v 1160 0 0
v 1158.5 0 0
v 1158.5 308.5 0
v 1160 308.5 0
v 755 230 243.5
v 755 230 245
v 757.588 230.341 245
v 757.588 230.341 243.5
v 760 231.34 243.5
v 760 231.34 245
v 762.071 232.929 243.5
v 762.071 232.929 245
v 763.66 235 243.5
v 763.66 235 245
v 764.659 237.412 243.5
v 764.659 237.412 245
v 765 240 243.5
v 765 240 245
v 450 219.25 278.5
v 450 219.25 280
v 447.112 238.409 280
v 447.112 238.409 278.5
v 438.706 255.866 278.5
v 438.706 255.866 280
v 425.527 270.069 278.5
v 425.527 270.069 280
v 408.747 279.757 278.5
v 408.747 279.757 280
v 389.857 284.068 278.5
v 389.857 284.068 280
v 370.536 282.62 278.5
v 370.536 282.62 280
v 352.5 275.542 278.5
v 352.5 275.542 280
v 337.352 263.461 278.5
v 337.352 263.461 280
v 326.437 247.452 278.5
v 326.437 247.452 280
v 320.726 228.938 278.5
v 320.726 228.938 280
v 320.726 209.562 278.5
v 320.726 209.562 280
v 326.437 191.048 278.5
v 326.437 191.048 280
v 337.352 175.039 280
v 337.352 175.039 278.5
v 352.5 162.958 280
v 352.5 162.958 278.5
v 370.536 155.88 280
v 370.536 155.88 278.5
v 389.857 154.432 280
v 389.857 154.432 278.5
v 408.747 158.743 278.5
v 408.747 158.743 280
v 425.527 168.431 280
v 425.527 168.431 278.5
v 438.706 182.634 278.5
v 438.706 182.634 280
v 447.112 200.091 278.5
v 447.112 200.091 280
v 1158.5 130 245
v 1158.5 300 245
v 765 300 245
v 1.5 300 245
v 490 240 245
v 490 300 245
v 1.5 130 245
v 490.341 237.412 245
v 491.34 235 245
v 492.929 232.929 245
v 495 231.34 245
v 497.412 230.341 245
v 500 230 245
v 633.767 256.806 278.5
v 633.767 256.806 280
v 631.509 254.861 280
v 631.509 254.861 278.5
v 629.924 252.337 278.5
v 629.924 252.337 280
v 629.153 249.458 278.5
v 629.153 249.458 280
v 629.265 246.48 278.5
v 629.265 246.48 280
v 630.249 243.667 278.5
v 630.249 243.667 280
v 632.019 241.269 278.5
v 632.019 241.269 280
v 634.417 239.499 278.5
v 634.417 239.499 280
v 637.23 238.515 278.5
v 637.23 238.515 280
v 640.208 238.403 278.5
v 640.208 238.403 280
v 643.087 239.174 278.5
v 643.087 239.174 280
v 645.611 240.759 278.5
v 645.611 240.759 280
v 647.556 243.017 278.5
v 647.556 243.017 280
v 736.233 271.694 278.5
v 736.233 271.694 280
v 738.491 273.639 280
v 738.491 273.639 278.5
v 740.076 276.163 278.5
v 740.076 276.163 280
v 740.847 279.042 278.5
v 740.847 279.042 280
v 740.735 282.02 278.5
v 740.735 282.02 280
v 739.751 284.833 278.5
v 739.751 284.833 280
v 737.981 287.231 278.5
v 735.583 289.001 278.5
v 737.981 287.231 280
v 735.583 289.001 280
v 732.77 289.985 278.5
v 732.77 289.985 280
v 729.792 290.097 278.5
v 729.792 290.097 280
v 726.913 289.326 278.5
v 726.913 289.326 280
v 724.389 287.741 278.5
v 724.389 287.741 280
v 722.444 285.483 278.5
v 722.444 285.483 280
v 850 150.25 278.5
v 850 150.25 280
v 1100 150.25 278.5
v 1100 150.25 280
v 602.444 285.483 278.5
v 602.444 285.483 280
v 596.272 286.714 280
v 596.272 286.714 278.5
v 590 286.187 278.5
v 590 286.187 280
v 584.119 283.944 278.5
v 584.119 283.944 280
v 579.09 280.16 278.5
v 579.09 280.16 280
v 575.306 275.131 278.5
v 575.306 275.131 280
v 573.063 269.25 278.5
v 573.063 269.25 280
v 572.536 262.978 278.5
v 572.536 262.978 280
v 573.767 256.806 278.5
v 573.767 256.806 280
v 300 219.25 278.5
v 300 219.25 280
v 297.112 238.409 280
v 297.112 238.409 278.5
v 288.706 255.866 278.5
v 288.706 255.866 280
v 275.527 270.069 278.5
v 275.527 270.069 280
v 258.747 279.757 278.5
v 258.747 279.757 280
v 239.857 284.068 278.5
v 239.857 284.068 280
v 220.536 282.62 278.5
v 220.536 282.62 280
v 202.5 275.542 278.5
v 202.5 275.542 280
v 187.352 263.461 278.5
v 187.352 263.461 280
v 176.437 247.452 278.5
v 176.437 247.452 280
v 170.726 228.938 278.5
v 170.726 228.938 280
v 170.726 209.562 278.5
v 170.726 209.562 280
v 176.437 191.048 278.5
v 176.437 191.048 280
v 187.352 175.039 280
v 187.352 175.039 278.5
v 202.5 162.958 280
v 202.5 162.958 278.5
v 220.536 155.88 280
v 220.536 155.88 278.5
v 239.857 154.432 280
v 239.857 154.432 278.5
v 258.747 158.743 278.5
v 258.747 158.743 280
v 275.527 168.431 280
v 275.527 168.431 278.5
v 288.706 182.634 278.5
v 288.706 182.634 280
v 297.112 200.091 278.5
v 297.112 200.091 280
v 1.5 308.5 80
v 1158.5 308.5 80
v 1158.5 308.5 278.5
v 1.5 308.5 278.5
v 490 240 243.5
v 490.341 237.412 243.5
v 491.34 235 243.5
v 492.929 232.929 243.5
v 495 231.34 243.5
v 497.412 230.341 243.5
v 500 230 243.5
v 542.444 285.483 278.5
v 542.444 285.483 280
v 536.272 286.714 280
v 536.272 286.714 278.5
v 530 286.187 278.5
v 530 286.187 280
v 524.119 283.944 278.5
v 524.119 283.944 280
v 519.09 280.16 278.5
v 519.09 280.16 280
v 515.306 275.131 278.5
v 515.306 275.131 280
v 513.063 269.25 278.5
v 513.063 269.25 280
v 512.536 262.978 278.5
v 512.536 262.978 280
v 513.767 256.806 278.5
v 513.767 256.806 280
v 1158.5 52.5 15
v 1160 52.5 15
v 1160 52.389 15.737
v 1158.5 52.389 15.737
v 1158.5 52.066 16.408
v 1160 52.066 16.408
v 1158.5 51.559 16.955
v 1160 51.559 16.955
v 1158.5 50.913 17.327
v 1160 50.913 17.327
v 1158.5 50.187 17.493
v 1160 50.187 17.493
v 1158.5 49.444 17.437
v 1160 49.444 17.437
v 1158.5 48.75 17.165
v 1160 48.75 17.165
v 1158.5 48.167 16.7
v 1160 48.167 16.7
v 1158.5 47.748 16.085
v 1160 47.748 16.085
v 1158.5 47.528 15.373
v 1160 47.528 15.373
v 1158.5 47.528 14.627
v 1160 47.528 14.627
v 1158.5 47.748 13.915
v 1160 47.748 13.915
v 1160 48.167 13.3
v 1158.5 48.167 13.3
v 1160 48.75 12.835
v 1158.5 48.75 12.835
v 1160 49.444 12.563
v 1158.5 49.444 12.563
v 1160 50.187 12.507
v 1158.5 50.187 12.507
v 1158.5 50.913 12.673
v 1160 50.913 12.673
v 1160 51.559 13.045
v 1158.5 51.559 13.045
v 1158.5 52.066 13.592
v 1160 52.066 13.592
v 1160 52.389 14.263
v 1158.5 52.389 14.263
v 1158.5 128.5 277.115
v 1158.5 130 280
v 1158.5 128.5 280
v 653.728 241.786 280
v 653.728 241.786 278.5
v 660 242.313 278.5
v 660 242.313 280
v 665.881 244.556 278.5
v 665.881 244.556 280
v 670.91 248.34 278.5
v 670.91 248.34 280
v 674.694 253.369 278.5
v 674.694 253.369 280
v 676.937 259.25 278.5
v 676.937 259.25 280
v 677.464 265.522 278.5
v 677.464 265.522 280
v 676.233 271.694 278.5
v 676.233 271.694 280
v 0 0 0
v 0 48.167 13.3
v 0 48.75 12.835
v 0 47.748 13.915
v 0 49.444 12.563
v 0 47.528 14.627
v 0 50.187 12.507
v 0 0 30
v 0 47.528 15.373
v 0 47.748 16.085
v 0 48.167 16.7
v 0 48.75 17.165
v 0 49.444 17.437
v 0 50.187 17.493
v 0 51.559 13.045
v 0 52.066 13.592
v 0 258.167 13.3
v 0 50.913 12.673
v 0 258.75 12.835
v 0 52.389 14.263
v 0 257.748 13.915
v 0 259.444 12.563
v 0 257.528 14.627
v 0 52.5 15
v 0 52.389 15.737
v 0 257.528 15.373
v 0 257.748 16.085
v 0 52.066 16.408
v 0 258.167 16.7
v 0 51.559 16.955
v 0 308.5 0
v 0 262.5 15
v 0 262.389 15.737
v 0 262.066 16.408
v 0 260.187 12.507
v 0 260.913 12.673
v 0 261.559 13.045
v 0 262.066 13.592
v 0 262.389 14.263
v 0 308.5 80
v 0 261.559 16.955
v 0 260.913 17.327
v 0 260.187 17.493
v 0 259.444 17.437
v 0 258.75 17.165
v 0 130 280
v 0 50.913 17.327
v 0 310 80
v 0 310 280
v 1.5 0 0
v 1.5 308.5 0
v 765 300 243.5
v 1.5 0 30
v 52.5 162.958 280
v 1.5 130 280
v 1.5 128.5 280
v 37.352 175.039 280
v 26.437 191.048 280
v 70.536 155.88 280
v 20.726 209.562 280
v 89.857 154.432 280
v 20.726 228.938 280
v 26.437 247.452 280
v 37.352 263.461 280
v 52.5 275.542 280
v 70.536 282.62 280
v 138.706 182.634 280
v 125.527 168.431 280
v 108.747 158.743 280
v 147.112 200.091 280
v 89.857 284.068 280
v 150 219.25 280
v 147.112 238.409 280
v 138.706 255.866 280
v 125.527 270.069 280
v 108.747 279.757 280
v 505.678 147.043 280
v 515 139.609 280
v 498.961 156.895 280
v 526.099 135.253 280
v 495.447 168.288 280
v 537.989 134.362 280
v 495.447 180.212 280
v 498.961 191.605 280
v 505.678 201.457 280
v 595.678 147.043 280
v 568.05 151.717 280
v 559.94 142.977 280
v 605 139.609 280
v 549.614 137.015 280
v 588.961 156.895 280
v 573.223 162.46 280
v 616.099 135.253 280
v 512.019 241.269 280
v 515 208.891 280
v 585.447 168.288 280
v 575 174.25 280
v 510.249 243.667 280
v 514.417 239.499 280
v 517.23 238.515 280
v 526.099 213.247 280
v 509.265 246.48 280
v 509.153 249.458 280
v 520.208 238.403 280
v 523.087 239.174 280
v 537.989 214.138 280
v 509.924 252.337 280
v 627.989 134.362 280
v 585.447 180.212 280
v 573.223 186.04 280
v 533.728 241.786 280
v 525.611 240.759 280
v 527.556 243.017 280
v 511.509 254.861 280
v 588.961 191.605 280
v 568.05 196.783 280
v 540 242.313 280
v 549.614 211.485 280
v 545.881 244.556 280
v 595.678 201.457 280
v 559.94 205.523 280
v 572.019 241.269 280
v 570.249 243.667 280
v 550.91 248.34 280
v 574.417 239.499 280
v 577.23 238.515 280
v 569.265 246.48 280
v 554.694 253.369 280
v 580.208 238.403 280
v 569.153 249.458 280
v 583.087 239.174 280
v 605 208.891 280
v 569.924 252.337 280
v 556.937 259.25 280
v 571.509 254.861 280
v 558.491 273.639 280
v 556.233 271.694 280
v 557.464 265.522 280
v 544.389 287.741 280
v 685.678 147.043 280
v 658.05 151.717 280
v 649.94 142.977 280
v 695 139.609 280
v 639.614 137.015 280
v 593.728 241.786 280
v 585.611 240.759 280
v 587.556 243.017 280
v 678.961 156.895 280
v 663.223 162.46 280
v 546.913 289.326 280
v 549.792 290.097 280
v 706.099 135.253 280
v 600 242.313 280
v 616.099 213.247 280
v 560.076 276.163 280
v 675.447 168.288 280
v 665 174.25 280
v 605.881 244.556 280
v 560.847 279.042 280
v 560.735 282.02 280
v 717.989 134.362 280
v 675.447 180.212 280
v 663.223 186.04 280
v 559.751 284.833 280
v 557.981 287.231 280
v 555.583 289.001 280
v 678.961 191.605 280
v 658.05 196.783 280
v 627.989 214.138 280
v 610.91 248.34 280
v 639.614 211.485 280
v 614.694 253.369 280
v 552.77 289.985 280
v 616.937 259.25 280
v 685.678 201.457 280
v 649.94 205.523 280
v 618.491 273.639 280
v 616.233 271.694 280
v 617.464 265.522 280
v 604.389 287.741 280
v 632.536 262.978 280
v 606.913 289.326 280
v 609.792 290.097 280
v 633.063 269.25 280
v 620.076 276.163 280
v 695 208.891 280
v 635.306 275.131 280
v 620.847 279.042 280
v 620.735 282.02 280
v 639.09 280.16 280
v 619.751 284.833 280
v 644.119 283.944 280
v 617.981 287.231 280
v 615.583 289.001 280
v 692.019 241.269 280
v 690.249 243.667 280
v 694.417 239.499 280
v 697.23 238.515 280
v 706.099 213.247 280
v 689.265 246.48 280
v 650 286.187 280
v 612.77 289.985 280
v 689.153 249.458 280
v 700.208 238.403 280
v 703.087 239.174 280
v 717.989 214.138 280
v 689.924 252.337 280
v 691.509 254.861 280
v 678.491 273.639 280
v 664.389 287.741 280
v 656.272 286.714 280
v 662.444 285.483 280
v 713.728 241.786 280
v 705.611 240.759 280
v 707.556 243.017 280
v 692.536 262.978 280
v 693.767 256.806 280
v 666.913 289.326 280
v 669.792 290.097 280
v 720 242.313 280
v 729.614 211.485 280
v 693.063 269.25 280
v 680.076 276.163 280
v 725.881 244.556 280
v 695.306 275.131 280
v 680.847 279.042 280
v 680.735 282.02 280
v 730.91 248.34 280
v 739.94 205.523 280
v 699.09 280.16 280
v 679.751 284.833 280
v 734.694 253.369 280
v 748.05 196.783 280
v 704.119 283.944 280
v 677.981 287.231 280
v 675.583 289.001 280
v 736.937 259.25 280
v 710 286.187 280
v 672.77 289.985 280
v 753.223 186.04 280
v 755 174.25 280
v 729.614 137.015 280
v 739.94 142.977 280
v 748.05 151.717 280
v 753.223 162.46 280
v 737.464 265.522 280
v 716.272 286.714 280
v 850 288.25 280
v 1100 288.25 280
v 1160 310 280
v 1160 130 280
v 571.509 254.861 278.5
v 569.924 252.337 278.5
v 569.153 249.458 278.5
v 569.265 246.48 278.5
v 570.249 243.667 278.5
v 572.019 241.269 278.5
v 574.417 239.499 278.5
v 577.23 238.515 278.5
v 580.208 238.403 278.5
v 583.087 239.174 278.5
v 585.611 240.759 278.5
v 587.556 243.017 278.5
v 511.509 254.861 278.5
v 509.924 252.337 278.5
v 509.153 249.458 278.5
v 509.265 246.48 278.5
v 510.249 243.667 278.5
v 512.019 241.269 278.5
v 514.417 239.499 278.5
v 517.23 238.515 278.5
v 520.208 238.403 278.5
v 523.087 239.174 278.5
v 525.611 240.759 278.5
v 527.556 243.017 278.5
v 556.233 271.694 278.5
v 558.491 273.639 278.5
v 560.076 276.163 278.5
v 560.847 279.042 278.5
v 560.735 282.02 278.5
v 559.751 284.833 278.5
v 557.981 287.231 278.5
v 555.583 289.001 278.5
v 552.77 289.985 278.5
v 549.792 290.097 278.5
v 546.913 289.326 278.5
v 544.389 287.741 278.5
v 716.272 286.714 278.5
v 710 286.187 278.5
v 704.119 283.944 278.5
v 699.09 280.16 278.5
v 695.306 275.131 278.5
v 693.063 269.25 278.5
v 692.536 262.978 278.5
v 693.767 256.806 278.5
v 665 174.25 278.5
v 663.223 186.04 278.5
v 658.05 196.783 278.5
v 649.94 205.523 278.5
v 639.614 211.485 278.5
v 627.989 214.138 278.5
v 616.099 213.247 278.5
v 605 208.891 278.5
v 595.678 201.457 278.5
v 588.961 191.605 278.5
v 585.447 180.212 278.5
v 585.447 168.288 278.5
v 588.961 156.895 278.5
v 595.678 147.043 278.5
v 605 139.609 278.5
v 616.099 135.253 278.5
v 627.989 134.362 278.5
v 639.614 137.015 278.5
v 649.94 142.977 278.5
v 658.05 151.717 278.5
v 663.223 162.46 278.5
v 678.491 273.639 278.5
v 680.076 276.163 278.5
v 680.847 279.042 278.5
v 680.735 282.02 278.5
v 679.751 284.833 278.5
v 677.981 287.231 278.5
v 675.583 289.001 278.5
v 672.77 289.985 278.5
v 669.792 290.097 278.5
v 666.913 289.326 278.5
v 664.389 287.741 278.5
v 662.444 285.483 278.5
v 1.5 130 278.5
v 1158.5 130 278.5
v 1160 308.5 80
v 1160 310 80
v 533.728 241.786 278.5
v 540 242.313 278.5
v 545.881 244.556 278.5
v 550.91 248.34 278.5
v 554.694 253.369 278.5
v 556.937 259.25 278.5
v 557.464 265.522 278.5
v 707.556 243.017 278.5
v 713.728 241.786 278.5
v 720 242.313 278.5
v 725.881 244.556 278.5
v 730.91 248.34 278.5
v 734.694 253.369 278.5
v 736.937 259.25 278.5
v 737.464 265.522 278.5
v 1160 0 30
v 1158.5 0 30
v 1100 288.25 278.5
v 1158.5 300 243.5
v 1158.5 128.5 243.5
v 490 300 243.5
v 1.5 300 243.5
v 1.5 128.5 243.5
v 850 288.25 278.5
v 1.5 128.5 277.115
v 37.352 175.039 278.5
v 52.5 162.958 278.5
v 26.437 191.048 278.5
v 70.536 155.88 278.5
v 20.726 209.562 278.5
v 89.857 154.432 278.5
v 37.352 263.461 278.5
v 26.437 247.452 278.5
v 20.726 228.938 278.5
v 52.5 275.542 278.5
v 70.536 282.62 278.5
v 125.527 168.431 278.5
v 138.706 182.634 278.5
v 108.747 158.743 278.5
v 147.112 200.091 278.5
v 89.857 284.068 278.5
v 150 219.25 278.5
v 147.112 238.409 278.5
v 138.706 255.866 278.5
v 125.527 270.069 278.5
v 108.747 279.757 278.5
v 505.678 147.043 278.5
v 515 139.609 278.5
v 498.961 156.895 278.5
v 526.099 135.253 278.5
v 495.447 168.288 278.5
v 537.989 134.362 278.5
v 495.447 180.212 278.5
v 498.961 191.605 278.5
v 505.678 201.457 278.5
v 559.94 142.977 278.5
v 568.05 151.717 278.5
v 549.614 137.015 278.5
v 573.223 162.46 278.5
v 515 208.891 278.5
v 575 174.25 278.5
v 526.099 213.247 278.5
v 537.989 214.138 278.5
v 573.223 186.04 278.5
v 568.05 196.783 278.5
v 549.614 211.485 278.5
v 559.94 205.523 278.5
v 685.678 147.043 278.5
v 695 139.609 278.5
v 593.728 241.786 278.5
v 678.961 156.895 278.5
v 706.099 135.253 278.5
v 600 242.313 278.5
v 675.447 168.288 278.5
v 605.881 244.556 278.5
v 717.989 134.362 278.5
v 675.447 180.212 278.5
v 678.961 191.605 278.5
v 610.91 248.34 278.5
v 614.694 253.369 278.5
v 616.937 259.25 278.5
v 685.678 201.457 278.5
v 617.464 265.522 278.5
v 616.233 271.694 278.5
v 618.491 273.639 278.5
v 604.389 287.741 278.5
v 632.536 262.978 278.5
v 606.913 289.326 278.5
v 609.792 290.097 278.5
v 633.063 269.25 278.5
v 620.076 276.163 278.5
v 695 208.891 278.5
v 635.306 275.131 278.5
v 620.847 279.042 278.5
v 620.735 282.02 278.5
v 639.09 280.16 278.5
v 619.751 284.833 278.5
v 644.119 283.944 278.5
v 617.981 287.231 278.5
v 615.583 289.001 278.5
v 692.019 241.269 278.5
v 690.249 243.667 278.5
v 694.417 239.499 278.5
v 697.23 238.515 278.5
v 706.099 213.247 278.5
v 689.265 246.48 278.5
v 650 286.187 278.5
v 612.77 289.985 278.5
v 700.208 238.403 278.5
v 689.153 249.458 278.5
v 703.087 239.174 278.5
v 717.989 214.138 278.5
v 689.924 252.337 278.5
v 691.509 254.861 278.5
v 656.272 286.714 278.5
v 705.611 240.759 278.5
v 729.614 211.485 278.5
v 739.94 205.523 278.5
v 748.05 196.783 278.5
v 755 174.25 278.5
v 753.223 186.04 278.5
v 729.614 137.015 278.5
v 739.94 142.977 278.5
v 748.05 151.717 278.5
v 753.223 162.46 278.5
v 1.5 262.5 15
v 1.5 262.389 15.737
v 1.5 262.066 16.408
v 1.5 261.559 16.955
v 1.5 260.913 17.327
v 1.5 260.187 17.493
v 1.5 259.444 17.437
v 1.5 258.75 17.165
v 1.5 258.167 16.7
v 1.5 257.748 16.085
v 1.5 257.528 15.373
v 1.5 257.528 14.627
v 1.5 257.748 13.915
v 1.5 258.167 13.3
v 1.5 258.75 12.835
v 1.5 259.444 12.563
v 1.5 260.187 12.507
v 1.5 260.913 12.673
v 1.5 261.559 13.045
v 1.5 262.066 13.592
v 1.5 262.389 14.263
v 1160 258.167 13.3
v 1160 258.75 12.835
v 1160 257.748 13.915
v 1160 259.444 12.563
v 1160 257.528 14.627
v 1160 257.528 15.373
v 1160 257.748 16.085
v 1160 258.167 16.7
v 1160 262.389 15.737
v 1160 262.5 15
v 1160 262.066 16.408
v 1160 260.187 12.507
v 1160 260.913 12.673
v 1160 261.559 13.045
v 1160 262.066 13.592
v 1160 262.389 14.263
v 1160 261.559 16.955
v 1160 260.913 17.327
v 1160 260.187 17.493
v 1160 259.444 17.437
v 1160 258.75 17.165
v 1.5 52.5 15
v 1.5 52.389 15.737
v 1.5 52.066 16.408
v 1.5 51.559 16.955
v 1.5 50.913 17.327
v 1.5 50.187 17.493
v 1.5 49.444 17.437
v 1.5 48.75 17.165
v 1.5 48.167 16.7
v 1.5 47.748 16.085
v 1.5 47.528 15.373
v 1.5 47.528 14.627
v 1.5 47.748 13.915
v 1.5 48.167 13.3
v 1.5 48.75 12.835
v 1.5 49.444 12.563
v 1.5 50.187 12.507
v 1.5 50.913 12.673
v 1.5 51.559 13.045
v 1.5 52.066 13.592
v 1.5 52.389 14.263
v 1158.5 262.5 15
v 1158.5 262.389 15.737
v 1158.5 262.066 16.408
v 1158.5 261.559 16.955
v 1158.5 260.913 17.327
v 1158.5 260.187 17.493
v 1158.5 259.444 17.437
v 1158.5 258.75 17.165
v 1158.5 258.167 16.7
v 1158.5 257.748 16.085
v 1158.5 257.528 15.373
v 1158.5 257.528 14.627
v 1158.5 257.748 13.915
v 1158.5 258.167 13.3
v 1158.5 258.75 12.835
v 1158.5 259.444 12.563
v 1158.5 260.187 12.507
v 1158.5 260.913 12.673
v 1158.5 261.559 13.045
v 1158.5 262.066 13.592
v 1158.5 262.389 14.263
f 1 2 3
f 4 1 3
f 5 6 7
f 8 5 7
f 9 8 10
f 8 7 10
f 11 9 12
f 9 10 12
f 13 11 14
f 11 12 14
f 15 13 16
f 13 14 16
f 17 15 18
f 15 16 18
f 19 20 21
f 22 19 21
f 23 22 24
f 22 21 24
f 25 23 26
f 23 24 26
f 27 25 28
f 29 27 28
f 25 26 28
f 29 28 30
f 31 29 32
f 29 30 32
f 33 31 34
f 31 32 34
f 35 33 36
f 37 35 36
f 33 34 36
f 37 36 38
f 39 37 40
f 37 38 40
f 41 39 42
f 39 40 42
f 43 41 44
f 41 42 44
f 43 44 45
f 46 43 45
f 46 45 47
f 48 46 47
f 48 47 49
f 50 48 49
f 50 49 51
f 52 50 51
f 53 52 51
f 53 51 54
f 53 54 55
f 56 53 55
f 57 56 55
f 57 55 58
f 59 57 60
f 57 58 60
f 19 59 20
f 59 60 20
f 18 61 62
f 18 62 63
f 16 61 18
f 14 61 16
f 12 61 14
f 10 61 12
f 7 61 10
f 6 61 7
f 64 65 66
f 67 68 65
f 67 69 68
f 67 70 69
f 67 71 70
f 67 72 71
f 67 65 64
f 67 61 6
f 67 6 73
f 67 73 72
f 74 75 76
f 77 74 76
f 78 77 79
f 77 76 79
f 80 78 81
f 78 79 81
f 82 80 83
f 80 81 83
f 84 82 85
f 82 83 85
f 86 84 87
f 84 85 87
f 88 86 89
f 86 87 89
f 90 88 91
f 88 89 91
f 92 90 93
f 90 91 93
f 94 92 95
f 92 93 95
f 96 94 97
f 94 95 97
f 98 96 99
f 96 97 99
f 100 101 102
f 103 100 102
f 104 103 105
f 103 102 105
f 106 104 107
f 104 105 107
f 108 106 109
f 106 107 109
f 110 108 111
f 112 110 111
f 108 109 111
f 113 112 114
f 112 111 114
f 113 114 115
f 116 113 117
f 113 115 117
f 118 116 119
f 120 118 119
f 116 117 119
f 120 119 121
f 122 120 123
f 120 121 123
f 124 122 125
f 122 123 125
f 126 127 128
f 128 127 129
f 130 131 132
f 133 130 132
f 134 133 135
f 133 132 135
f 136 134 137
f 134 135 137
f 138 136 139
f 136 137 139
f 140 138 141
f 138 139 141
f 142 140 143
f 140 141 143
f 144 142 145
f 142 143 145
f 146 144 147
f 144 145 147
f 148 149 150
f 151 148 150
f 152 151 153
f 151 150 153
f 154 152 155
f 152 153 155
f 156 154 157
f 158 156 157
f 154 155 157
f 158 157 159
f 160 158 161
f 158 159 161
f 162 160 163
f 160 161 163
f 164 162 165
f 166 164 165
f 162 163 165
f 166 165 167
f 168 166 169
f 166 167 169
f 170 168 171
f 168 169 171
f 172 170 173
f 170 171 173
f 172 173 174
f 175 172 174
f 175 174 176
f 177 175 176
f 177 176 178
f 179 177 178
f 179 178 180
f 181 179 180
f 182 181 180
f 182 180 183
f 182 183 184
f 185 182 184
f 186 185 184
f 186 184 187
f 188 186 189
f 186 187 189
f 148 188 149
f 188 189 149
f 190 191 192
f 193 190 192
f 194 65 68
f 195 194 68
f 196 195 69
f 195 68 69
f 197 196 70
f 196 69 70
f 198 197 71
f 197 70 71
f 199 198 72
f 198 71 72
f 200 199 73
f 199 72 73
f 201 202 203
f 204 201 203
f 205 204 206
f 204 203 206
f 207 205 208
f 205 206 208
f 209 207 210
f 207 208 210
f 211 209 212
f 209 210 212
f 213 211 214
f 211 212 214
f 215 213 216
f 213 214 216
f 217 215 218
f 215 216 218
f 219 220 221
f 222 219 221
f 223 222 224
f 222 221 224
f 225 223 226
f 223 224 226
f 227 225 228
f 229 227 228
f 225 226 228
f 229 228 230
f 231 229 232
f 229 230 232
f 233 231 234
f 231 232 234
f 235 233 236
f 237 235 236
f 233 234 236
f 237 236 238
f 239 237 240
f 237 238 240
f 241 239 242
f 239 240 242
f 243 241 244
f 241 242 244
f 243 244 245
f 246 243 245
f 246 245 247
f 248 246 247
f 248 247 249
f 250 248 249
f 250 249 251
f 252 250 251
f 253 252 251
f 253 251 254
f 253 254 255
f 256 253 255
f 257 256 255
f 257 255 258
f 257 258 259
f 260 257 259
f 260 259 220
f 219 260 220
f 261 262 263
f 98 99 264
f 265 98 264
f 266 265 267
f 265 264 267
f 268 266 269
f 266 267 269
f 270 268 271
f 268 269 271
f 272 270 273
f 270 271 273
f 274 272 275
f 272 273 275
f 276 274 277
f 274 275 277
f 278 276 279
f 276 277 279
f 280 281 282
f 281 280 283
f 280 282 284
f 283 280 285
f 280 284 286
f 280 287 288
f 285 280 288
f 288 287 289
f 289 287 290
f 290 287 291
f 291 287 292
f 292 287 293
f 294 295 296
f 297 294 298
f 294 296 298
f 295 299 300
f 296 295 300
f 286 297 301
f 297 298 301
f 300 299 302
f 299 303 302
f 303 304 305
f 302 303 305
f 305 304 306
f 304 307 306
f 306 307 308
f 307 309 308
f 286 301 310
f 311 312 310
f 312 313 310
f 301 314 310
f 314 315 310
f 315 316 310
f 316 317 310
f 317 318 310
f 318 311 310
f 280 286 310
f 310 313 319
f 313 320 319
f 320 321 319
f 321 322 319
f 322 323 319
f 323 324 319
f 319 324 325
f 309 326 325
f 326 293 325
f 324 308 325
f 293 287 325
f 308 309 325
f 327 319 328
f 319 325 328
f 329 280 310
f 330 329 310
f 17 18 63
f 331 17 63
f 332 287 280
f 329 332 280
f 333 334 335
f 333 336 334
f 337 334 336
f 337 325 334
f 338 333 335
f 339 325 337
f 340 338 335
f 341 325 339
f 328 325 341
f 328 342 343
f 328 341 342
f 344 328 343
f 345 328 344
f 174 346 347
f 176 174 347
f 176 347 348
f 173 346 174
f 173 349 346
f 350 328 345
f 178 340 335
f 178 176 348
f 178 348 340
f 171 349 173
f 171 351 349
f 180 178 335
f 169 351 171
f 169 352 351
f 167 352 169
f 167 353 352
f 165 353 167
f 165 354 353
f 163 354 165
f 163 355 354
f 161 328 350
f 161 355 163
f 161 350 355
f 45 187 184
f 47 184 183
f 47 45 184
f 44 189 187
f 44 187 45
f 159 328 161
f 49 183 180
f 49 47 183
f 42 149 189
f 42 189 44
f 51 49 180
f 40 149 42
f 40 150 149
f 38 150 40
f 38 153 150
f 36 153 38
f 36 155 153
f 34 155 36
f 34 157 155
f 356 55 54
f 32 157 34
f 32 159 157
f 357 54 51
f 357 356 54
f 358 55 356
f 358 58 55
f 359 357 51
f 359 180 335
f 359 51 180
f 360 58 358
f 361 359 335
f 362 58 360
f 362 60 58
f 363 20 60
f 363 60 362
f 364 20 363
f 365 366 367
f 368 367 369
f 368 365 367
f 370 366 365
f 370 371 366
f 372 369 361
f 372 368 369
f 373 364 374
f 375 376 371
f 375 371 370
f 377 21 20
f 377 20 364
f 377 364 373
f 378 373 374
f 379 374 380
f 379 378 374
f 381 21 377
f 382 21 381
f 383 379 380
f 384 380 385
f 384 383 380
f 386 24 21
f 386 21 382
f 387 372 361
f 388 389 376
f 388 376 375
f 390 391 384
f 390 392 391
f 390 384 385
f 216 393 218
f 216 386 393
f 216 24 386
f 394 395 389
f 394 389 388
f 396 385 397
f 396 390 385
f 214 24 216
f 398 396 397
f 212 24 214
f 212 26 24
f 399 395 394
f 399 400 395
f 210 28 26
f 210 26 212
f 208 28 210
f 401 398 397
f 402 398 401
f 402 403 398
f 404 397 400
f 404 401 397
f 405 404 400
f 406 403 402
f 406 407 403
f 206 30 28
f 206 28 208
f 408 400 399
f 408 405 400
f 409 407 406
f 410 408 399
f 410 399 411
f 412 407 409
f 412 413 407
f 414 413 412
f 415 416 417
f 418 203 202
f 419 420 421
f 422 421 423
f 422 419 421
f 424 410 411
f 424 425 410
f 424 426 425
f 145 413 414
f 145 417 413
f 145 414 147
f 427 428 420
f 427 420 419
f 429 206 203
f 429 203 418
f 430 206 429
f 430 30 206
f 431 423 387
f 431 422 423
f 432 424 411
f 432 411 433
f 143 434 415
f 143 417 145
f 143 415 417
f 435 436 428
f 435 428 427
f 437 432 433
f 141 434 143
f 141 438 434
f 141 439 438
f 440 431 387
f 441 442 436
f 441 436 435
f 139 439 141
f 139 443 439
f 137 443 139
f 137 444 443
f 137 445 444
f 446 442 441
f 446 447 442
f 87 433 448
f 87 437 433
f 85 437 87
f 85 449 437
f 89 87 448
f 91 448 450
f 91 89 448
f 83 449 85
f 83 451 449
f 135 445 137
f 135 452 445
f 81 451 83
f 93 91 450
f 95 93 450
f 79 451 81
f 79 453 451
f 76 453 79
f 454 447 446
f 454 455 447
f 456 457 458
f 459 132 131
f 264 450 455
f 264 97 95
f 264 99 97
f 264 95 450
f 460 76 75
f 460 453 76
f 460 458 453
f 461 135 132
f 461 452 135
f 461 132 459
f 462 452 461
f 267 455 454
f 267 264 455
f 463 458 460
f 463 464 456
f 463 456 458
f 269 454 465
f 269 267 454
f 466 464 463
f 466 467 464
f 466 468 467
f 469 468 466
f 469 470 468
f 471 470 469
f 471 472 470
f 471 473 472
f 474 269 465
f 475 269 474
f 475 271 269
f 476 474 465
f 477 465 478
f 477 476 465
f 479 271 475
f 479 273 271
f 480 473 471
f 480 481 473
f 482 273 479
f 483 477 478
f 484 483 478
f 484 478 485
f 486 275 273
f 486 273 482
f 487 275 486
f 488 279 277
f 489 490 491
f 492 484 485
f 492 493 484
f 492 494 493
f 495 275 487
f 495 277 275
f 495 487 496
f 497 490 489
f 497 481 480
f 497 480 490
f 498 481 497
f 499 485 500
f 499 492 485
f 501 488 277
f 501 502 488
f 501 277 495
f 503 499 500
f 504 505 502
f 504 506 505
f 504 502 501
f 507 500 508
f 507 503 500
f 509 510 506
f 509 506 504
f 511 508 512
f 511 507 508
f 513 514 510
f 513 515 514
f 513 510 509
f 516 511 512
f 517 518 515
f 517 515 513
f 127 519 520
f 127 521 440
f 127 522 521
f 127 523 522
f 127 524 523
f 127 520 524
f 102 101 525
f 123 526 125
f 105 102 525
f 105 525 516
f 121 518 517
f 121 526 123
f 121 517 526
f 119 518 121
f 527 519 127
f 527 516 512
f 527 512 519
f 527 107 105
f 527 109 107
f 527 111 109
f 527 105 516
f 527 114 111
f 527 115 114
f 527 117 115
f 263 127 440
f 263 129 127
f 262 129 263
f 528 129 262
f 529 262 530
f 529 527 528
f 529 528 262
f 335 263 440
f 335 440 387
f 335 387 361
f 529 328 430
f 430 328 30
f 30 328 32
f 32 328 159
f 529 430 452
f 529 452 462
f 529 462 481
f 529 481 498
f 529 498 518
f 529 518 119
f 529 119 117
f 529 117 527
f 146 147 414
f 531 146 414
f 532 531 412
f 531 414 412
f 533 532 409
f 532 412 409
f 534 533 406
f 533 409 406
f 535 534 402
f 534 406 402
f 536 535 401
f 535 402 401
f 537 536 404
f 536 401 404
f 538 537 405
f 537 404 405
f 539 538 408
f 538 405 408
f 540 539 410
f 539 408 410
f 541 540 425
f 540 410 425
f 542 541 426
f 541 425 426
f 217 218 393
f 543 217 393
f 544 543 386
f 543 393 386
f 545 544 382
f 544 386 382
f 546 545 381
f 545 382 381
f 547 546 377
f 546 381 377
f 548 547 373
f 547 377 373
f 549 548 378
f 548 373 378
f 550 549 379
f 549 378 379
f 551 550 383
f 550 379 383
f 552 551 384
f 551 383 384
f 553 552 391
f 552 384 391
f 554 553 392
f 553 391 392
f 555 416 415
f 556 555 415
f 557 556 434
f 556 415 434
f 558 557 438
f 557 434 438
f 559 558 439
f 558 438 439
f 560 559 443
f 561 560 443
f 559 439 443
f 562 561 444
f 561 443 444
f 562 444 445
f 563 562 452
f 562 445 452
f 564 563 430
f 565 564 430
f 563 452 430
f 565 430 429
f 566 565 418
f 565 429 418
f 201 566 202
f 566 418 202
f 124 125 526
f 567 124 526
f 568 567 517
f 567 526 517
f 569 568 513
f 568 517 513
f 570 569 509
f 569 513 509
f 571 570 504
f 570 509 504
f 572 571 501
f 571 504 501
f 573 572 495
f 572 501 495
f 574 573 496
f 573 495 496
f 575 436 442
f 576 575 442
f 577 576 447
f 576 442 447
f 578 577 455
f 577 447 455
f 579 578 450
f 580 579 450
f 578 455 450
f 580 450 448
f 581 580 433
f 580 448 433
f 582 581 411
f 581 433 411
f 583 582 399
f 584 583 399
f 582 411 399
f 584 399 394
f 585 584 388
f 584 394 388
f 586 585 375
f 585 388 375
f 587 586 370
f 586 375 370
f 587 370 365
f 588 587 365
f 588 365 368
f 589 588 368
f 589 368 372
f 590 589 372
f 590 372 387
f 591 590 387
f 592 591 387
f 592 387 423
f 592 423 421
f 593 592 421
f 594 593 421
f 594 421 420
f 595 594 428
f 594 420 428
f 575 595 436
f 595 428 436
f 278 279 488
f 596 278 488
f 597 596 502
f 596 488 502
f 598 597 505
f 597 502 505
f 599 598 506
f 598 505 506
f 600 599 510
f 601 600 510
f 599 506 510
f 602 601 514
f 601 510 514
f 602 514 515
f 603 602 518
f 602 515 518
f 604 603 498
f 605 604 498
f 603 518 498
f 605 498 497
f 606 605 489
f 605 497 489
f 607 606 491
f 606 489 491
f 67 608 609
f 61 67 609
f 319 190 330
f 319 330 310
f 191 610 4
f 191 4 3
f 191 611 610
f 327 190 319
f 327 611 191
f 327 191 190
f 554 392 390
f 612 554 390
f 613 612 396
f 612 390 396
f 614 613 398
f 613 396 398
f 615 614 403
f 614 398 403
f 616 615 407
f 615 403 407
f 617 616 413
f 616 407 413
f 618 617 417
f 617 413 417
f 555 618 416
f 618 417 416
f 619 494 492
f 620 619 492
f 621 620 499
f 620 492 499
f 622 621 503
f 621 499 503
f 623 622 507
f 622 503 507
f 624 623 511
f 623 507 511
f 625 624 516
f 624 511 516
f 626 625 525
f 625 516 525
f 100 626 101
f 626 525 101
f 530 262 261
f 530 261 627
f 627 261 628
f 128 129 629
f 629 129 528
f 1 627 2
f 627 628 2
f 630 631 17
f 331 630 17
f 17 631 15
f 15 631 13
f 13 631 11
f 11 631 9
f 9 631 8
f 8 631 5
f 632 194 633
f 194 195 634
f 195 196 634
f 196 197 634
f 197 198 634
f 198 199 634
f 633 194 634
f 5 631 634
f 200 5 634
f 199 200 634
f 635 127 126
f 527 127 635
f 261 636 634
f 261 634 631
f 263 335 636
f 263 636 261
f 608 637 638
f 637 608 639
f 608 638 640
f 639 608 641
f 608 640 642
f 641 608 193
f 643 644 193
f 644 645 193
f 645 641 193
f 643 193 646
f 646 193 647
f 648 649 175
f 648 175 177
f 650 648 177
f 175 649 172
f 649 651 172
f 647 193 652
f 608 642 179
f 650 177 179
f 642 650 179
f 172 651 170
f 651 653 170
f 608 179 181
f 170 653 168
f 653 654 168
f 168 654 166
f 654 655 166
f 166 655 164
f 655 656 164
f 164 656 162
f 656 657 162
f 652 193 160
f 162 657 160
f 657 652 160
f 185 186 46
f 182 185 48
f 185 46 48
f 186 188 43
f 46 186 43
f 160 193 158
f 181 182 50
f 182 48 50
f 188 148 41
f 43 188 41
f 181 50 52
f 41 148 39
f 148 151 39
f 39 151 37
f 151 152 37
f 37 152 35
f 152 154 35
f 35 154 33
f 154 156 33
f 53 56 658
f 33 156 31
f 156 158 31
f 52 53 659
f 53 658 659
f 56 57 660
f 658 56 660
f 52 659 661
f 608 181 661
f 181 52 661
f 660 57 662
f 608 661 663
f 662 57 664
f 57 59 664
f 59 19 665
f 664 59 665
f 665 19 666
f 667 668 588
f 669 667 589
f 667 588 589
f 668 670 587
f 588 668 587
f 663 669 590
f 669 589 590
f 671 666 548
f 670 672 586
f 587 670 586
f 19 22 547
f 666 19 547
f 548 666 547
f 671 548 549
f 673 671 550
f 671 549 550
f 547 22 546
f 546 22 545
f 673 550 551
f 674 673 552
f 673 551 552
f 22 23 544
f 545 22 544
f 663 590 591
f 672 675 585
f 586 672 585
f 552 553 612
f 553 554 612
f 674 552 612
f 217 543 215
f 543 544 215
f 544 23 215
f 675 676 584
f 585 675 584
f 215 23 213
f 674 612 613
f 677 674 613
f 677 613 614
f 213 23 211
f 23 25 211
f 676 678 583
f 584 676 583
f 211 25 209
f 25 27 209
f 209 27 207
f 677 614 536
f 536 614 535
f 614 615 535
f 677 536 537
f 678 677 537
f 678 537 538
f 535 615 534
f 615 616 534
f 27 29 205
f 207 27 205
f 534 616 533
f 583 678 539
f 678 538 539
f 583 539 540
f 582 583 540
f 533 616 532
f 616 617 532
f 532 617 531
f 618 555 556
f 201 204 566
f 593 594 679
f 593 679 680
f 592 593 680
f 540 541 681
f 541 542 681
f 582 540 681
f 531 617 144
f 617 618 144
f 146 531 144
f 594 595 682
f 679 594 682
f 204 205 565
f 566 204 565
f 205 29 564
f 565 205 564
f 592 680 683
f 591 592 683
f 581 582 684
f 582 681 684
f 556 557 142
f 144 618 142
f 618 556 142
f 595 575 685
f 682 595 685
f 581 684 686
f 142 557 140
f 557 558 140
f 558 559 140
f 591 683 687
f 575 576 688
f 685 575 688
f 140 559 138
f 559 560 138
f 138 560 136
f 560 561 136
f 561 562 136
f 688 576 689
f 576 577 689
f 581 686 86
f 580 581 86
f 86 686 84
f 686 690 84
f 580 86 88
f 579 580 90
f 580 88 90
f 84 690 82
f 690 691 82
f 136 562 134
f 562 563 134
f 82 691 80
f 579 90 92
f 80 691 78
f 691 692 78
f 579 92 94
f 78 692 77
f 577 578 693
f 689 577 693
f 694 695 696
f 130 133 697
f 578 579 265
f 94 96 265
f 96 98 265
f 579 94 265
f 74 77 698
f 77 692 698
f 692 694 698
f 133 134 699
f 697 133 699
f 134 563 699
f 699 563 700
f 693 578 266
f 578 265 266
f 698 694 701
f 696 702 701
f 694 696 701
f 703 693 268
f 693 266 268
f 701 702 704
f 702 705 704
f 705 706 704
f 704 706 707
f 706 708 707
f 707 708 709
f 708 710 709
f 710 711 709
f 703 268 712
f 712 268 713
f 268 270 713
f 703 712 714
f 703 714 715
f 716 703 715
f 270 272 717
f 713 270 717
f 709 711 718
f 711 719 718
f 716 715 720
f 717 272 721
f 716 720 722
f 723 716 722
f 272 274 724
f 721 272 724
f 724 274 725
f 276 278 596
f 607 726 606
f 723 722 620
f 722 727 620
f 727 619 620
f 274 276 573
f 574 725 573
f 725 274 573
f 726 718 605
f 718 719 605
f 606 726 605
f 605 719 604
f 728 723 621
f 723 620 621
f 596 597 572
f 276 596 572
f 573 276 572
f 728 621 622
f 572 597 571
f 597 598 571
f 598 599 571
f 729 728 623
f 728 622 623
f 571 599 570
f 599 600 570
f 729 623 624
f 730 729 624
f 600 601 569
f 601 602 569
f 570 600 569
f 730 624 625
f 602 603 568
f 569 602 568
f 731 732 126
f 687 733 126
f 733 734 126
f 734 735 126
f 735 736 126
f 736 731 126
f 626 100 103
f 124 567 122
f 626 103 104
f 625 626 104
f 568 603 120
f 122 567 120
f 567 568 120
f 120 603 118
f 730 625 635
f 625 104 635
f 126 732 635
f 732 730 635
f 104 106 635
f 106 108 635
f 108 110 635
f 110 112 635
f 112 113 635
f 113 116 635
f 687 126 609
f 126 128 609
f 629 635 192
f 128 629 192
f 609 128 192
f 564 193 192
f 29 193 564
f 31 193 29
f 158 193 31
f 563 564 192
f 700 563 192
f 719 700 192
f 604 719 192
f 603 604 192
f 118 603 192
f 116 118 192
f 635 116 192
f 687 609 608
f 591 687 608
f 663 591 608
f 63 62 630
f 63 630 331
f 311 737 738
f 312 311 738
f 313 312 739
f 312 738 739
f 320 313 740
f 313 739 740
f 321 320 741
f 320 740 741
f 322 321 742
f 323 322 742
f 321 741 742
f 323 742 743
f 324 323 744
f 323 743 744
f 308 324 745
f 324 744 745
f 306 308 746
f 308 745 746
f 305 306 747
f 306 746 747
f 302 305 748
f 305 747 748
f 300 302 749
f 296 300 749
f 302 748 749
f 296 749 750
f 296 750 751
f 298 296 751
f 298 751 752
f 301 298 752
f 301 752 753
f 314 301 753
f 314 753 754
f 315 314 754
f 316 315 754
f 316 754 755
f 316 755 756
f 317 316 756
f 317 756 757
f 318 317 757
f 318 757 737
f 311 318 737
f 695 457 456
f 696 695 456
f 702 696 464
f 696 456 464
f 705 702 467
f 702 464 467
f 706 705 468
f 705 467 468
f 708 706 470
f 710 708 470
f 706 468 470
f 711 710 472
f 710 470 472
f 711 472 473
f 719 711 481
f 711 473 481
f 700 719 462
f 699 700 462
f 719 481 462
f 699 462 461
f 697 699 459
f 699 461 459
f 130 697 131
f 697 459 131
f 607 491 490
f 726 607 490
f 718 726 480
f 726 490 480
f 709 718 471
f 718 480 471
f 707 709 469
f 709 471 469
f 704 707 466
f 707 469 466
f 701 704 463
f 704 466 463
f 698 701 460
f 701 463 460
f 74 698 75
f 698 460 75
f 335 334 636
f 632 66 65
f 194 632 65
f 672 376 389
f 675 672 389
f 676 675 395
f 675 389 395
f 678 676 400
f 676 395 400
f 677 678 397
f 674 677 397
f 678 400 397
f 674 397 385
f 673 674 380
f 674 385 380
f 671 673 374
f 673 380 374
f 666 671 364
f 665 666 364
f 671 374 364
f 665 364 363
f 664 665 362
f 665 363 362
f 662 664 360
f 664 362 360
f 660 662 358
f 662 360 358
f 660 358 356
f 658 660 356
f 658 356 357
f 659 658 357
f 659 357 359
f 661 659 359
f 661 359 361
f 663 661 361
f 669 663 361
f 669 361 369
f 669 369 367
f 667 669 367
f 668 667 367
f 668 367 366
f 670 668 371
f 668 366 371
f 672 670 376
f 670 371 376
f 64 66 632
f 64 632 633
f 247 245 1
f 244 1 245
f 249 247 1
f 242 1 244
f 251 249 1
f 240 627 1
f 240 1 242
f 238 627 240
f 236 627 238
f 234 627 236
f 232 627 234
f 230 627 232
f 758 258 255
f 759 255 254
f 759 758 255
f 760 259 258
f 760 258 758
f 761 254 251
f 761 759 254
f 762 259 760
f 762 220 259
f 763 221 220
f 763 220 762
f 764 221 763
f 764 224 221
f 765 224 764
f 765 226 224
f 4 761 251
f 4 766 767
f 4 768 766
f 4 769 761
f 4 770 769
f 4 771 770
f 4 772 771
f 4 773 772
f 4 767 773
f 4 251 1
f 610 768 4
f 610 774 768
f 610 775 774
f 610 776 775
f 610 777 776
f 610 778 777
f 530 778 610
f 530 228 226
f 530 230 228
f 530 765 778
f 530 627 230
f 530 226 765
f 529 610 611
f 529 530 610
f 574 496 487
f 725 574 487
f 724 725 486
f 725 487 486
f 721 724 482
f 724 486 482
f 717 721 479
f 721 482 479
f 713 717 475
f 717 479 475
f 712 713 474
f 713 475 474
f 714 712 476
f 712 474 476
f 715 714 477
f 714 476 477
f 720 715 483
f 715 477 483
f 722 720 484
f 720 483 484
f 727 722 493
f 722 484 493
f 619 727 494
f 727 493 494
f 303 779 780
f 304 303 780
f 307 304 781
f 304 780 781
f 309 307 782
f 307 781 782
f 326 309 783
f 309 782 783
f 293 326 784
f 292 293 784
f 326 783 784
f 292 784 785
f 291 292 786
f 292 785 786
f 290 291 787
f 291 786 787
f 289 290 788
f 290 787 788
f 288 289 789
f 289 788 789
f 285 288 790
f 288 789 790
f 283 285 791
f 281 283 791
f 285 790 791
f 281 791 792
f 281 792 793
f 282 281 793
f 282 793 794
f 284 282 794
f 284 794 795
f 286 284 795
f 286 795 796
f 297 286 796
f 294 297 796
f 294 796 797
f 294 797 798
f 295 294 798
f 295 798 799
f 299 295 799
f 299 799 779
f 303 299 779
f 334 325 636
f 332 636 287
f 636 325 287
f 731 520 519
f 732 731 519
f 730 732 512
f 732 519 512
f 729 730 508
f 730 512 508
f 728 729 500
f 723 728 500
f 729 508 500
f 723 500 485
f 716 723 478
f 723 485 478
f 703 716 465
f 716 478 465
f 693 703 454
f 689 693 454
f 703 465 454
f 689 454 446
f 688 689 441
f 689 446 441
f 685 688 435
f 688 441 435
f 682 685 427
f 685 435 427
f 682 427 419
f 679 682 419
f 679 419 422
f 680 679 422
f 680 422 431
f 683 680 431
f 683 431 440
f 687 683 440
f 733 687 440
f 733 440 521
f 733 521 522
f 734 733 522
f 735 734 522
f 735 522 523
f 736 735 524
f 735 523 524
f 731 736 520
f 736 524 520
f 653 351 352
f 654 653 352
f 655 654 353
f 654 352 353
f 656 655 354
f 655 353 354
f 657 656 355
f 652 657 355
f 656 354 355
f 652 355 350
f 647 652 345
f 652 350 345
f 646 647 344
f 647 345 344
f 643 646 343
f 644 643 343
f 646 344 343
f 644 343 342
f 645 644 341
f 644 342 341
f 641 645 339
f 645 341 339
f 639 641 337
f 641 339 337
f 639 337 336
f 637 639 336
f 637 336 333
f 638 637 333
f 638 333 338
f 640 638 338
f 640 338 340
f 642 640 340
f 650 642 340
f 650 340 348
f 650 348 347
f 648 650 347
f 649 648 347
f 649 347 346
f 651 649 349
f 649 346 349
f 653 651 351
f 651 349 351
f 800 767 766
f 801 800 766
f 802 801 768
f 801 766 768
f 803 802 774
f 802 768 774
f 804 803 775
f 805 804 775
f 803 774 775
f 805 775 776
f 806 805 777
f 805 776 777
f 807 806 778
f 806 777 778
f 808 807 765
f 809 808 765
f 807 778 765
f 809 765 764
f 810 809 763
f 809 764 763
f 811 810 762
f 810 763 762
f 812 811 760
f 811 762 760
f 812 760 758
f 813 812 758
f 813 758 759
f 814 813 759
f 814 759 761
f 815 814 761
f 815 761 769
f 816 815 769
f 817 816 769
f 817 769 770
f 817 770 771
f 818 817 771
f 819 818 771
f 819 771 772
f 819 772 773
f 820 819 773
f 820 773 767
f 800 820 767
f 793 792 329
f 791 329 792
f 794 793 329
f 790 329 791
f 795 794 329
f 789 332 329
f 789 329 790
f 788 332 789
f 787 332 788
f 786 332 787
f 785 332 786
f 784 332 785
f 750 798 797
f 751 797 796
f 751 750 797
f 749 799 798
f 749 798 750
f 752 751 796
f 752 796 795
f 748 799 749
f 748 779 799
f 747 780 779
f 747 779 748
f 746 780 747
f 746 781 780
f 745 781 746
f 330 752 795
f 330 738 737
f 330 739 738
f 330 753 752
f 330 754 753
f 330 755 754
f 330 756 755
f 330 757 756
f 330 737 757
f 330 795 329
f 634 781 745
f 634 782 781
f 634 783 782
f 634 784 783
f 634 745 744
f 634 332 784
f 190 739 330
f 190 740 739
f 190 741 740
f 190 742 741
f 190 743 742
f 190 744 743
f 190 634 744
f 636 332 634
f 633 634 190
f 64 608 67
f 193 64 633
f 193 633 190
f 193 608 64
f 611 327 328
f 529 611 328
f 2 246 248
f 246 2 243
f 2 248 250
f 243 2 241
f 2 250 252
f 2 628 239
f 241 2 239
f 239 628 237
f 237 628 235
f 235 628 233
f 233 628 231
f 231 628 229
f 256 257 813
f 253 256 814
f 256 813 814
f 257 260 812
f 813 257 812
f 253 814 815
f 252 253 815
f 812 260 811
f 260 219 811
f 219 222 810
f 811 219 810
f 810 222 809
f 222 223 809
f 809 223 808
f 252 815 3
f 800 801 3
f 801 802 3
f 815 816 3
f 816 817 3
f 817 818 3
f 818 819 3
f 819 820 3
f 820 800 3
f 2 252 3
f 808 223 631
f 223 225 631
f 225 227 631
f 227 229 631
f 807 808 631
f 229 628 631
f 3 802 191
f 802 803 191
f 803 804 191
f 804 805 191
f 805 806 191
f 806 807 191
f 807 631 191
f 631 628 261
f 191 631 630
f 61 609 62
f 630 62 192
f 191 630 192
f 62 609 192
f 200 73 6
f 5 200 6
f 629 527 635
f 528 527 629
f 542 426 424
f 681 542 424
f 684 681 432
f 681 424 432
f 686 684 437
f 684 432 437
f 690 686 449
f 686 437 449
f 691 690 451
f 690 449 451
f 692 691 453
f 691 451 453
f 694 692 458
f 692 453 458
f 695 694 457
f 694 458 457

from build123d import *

# Parameters (mm, degrees)
F1_DEPTH  = 1160
F2_T      = -1.5
F3_W      = 1157
F3_H      = 1.5
F4_DEPTH  = 180
F5_W      = 1157
F5_H      = 1.5
F6_DEPTH  = 35
F7_W      = 1157
F7_H      = 1.5
F8_DEPTH  = 170
F9_W      = 1160
F9_H      = 80
F10_DEPTH = 1.5
F11_R     = 65
F11_R_2   = 40
F11_W     = 250
F11_H     = 138
F12_DEPTH = 1.5
F14_DEPTH = 245.001
F15_R     = 2.5
F16_DEPTH = 1160.001


with BuildPart() as f1:
    # F0 (on Right) → F1 (new body)
    with BuildSketch(Plane.YZ):
        Polygon((0, 30), (0, 0), (310, 0), (310, 280), (130, 280), align=None)
    extrude(amount=F1_DEPTH)

    # F2
    f2_openings = [f1.faces().sort_by_distance(p)[0] for p in [
        (580, 65, 155),
        (580, 220, 280),
        (580, 0, 15),
        (580, 155, 0),
    ]]
    offset(amount=F2_T, openings=f2_openings)

    # F3 (on face) → F4 (join)
    with BuildSketch(Plane.XZ.offset(-308.5)):
        with Locations((580, 279.25)):
            Rectangle(F3_W, F3_H)
    extrude(amount=F4_DEPTH)

    # F5 (on face) → F6 (join)
    with BuildSketch(Plane(origin=(0, 0, 278.5), x_dir=(1, 0, 0), z_dir=(0, 0, -1))):
        with Locations((580, -129.25)):
            Rectangle(F5_W, F5_H)
    extrude(amount=F6_DEPTH)

    # F7 (on face) → F8 (join)
    with BuildSketch(Plane(origin=(0, 130, 0), x_dir=(-1, 0, 0), z_dir=(0, 1, 0))):
        with Locations((-580, 244.25)):
            Rectangle(F7_W, F7_H)
    extrude(amount=F8_DEPTH)

    # F9 (on face) → F10 (cut)
    with BuildSketch(Plane(origin=(0, 310, 0), x_dir=(-1, 0, 0), z_dir=(0, 1, 0))):
        with Locations((-580, 40)):
            Rectangle(F9_W, F9_H)
    extrude(amount=-F10_DEPTH, mode=Mode.SUBTRACT)

    # F11 (on face) → F12 (cut, through all)
    with BuildSketch(Plane.XY.offset(280)):
        with Locations((85, 219.25)):
            Circle(F11_R)
        with Locations((235, 219.25)):
            Circle(F11_R)
        with Locations((385, 219.25)):
            Circle(F11_R)
        with Locations((535, 174.25)):
            Circle(F11_R_2)
        with Locations((625, 174.25)):
            Circle(F11_R_2)
        with Locations((715, 174.25)):
            Circle(F11_R_2)
        with BuildLine():
            ThreePointArc((513.767183, 256.805709), (512.01903, 241.26903), (527.555709, 243.017183))
            ThreePointArc((527.555709, 243.017183), (550.909903, 248.340097), (556.232817, 271.694291))
            ThreePointArc((556.232817, 271.694291), (557.98097, 287.23097), (542.444291, 285.482817))
            ThreePointArc((542.444291, 285.482817), (519.090097, 280.159903), (513.767183, 256.805709))
        make_face()
        with BuildLine():
            ThreePointArc((616.232817, 271.694291), (617.98097, 287.23097), (602.444291, 285.482817))
            ThreePointArc((602.444291, 285.482817), (579.090097, 280.159903), (573.767183, 256.805709))
            ThreePointArc((573.767183, 256.805709), (572.01903, 241.26903), (587.555709, 243.017183))
            ThreePointArc((587.555709, 243.017183), (610.909903, 248.340097), (616.232817, 271.694291))
        make_face()
        with BuildLine():
            ThreePointArc((676.232817, 271.694291), (677.98097, 287.23097), (662.444291, 285.482817))
            ThreePointArc((662.444291, 285.482817), (639.090097, 280.159903), (633.767183, 256.805709))
            ThreePointArc((633.767183, 256.805709), (632.01903, 241.26903), (647.555709, 243.017183))
            ThreePointArc((647.555709, 243.017183), (670.909903, 248.340097), (676.232817, 271.694291))
        make_face()
        with BuildLine():
            ThreePointArc((736.232817, 271.694291), (737.98097, 287.23097), (722.444291, 285.482817))
            ThreePointArc((722.444291, 285.482817), (699.090097, 280.159903), (693.767183, 256.805709))
            ThreePointArc((693.767183, 256.805709), (692.01903, 241.26903), (707.555709, 243.017183))
            ThreePointArc((707.555709, 243.017183), (730.909903, 248.340097), (736.232817, 271.694291))
        make_face()
        with Locations((975, 219.25)):
            Rectangle(F11_W, F11_H)
    extrude(amount=-F12_DEPTH, mode=Mode.SUBTRACT)

    # F13 (on face) → F14 (cut, through all)
    with BuildSketch(Plane.XY.offset(245)):
        with BuildLine():
            Line((765, 300), (490, 300))
            Line((490, 300), (490, 240))
            ThreePointArc((490, 240), (492.928932, 232.928932), (500, 230))
            Line((500, 230), (755, 230))
            ThreePointArc((755, 230), (762.071068, 232.928932), (765, 240))
            Line((765, 240), (765, 300))
        make_face()
    extrude(amount=-F14_DEPTH, mode=Mode.SUBTRACT)

    # F15 (on face) → F16 (cut, through all)
    with BuildSketch(Plane.YZ.offset(1160)):
        with Locations((260, 15)):
            Circle(F15_R)
        with Locations((50, 15)):
            Circle(F15_R)
    extrude(amount=-F16_DEPTH, mode=Mode.SUBTRACT)


solid = f1.part
